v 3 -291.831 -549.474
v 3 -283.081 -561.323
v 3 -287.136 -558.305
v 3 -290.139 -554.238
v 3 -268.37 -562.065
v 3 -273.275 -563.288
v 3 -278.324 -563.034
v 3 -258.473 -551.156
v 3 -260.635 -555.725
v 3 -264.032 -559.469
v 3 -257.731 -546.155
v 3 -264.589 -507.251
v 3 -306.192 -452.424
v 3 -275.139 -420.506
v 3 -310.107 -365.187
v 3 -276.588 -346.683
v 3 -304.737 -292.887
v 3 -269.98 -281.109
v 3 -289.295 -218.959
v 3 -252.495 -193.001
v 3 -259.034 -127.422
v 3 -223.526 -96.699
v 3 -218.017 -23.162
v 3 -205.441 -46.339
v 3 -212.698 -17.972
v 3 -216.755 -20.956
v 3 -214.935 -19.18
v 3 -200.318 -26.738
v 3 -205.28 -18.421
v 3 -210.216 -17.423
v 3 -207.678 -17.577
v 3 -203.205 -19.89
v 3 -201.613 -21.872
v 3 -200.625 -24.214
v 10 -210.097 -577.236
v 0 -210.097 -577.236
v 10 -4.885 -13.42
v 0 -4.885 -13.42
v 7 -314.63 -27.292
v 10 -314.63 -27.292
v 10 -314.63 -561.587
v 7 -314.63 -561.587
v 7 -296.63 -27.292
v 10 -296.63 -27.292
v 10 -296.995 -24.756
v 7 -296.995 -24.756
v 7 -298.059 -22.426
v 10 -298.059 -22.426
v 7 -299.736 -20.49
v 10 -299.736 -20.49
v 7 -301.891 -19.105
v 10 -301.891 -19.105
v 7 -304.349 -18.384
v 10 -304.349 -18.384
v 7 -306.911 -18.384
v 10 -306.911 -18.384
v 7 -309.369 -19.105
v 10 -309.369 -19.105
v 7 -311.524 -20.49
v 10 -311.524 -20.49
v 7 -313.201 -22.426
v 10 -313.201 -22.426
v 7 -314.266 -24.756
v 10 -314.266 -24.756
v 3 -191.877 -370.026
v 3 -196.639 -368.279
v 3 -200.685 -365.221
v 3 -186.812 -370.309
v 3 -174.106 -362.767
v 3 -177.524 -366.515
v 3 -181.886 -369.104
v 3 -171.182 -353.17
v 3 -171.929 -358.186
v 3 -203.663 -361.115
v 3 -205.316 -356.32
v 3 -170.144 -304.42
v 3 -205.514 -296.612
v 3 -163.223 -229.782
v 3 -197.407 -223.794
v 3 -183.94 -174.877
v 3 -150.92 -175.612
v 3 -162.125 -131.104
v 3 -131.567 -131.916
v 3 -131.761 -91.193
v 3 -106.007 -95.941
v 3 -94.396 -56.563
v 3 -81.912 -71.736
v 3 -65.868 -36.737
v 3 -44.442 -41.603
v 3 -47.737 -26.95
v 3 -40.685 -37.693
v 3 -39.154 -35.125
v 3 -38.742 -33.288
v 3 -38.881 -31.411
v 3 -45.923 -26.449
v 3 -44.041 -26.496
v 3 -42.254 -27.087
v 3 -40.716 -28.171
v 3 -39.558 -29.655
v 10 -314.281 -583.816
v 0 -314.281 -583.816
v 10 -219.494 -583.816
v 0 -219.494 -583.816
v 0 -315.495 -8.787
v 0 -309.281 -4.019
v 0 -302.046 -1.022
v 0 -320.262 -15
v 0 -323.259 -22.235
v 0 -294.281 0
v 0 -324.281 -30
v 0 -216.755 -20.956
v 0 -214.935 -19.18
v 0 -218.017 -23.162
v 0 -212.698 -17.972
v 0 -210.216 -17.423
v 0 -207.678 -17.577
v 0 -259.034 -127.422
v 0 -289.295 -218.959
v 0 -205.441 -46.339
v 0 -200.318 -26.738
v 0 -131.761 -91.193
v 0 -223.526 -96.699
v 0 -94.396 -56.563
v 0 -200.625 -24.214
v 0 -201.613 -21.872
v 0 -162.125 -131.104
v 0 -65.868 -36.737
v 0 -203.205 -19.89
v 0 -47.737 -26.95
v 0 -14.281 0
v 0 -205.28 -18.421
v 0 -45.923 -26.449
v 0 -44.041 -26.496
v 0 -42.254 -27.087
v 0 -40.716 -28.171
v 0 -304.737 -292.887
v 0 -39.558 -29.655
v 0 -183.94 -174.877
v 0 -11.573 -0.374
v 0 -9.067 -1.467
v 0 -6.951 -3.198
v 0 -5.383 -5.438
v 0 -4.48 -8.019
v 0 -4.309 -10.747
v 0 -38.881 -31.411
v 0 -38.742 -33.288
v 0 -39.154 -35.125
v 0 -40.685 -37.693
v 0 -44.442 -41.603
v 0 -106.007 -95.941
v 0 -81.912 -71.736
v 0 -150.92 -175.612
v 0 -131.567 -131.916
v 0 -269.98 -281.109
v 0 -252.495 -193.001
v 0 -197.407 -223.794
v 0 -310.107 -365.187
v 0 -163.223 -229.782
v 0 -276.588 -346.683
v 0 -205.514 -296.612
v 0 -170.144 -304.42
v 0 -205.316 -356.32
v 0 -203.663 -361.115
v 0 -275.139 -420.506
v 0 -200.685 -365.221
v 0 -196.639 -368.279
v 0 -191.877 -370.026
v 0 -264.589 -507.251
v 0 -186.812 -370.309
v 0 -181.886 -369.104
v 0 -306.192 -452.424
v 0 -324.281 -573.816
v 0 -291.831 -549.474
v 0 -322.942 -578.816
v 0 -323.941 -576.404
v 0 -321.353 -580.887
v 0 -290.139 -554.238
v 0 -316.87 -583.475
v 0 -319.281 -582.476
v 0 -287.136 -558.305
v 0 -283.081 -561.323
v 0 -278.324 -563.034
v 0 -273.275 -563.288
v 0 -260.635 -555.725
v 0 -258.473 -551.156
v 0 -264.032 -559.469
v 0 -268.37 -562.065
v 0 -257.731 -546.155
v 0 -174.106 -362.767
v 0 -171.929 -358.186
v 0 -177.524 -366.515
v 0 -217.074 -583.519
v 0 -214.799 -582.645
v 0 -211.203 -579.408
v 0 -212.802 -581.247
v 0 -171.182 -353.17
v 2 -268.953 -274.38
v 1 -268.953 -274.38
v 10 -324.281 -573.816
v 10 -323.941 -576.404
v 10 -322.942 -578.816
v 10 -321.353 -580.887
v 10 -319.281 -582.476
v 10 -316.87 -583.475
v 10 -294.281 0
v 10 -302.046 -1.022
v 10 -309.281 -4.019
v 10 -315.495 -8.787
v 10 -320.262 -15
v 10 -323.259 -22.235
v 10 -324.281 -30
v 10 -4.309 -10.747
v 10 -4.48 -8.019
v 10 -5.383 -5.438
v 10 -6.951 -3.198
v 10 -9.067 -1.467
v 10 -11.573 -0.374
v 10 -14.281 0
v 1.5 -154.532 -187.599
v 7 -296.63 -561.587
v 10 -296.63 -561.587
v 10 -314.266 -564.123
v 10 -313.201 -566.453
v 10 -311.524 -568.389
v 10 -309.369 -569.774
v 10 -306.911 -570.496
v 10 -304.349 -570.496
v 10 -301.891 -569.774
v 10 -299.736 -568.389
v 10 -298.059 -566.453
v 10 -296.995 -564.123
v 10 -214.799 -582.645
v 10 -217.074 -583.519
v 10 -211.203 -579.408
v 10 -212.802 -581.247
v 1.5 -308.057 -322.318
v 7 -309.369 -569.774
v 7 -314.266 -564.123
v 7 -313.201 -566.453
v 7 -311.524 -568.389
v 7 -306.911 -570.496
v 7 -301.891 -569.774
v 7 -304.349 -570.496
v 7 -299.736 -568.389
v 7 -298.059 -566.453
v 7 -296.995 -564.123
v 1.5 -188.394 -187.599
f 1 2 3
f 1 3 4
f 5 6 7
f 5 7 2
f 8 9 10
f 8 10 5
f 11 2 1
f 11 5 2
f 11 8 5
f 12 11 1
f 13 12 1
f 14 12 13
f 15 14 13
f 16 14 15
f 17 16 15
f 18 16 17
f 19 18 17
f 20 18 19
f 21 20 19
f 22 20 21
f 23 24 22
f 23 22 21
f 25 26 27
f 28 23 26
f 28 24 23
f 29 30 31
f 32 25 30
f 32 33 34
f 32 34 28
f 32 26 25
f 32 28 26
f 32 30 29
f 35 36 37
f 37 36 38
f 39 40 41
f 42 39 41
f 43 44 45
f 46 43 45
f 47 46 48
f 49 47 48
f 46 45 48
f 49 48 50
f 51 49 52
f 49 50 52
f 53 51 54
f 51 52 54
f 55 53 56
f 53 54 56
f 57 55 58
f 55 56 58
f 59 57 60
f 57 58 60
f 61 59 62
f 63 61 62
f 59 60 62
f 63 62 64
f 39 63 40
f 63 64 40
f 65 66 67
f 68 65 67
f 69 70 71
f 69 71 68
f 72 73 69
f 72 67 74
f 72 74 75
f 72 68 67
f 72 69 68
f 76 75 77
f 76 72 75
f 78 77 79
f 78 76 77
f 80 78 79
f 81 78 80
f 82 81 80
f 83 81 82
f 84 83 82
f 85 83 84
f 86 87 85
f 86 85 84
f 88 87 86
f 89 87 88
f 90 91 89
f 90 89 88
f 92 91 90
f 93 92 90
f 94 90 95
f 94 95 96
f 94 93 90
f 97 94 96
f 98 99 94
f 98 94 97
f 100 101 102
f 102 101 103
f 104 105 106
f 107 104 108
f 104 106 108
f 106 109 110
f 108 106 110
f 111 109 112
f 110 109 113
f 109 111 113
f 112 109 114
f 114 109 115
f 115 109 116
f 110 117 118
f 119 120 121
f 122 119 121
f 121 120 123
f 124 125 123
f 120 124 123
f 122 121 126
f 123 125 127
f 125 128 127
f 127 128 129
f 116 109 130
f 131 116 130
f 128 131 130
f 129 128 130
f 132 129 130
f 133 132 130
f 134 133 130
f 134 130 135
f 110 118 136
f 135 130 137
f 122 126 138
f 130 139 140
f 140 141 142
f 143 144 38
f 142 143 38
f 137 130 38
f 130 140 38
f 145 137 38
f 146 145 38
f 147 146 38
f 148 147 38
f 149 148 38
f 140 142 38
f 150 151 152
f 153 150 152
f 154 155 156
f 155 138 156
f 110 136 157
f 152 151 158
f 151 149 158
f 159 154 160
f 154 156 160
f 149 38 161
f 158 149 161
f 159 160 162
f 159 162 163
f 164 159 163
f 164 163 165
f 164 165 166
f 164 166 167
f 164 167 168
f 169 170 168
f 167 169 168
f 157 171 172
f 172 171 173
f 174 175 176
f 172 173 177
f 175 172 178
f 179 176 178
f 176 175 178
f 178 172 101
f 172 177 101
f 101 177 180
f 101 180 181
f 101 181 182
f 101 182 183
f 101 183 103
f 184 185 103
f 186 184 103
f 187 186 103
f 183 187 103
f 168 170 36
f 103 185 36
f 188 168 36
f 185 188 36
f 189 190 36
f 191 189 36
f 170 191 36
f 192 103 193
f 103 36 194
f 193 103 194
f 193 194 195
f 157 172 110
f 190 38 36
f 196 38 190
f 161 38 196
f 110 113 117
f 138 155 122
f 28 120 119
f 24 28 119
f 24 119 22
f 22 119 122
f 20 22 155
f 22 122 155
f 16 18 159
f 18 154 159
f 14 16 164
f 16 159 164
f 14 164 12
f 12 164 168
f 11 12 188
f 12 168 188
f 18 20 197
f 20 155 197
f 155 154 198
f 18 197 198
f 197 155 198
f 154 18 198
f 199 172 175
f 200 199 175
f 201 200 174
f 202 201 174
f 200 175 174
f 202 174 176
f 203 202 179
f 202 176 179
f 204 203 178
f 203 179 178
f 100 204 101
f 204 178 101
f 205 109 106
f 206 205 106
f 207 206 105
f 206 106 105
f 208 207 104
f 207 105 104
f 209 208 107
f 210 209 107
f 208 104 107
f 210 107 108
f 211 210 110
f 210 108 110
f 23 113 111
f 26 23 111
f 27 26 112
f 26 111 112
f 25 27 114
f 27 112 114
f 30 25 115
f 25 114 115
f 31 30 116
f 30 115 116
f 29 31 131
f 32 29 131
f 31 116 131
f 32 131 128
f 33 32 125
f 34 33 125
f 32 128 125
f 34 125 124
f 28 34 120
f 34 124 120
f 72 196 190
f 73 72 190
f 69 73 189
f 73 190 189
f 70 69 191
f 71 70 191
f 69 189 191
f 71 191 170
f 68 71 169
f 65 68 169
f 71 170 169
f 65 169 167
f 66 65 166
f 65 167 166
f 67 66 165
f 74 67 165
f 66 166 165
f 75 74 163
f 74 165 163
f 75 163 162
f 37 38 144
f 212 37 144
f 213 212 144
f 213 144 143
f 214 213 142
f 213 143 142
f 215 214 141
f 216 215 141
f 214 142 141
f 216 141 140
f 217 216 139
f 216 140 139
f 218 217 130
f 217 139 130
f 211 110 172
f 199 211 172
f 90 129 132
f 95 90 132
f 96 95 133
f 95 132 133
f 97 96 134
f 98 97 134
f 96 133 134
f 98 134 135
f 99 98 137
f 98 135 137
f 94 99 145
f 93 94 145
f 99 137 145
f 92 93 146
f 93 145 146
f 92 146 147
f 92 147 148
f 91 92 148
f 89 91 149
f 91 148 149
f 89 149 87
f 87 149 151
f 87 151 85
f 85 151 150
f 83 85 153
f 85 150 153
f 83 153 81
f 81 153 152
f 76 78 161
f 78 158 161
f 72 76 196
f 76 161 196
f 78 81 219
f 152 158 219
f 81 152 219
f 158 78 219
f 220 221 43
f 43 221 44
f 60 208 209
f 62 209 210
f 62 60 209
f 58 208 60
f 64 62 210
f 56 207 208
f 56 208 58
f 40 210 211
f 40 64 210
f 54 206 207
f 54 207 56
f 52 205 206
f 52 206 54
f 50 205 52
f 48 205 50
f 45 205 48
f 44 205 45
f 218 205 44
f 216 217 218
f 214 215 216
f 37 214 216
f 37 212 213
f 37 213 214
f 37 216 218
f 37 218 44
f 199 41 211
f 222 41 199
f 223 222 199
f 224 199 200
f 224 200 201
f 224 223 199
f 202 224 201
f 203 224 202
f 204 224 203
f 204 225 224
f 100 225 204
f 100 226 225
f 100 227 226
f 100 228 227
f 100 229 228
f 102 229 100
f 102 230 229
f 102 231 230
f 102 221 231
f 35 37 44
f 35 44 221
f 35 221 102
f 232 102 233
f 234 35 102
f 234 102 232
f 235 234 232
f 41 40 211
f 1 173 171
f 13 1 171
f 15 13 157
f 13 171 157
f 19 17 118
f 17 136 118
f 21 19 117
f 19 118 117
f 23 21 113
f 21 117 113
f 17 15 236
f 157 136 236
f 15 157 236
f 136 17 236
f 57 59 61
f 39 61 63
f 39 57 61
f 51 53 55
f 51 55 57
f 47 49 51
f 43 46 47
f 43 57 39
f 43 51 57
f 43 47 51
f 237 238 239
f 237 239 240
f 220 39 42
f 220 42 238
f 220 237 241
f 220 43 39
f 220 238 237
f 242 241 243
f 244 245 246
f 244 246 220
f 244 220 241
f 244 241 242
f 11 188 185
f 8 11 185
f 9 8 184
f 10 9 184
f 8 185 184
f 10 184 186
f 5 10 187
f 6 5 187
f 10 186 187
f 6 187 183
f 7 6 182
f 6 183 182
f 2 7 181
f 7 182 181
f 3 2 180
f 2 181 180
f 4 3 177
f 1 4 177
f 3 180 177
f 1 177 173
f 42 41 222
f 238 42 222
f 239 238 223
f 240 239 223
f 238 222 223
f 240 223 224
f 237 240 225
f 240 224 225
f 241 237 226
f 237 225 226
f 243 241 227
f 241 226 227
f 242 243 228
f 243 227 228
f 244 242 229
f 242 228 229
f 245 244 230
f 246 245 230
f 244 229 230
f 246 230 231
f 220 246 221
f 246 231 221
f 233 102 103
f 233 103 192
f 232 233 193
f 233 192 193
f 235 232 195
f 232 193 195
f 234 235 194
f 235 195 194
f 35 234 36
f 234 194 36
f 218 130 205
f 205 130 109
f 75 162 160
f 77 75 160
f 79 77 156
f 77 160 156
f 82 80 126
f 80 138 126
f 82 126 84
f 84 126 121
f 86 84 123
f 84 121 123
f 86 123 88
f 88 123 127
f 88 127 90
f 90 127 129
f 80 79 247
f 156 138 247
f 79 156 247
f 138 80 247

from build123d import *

# Parameters (mm, degrees)
BOSS_EXTRUDE1_DEPTH = 10
CUT_EXTRUDE4_DEPTH  = 3
CUT_EXTRUDE5_DEPTH  = 3


with BuildPart() as part:
    # Sketch1 → Boss-Extrude1 (new body)
    with BuildSketch(Plane(origin=(0, 0, 0), x_dir=(0, 0, -1), z_dir=(1, 0, 0))):
        with BuildLine():
            Line((0, -14.281480067), (0, -294.281480067))
            ThreePointArc((0, -294.281480067), (8.786796564, -315.494683503), (30, -324.281480067))
            Line((30, -324.281480067), (573.815572472, -324.281480067))
            ThreePointArc((573.815572472, -324.281480067), (580.886640283, -321.352547879), (583.815572472, -314.281480067))
            Line((583.815572472, -314.281480067), (583.815572472, -219.493566063))
            ThreePointArc((583.815572472, -219.493566063), (582.007092914, -213.757801699), (577.235773905, -210.096639855))
            Line((577.235773905, -210.096639855), (13.420201433, -4.88455386))
            ThreePointArc((13.420201433, -4.88455386), (4.264235636, -6.089959625), (0, -14.281480067))
        make_face()
    extrude(amount=BOSS_EXTRUDE1_DEPTH)

    # Sketch3 → Cut-Extrude4 (cut)
    with BuildSketch(Plane.ZY):
        with BuildLine():
            ThreePointArc((-23.162175785, -218.017297737), (-17.576945532, -207.678107035), (-26.738120061, -200.318314743))
            add(Edge.make_bspline(
                [(-26.738120061, -200.318314743), (-45.914354434, -200.660753587), (-151.32107334, -255.510398156), (-414.880335601, -286.385074175), (-542.431128002, -257.731725159), (-546.154906269, -257.731029979)],
                knots=[0, 0, 0, 0, 0.560935224, 0.660935224, 1, 1, 1, 1], degree=3))
            ThreePointArc((-546.154906269, -257.731029979), (-563.288388976, -273.27487263), (-549.474047026, -291.831036849))
            add(Edge.make_bspline(
                [(-549.474047026, -291.831036849), (-474.750080899, -306.502271197), (-284.669923623, -324.572171749), (-143.080818041, -266.034178467), (-23.162175785, -218.017297737)],
                knots=[0, 0, 0, 0, 0.423888314, 1, 1, 1, 1], degree=3))
        make_face()
        with BuildLine():
            ThreePointArc((-26.950185671, -47.737214996), (-28.17113687, -40.715672082), (-35.124917897, -39.154353359))
            add(Edge.make_bspline(
                [(-35.124917897, -39.154353359), (-50.602952828, -45.122445935), (-99.042539, -170.661871263), (-331.224003862, -171.181746235), (-353.169530365, -171.181734297)],
                knots=[0, 0, 0, 0, 0.639195597, 1, 1, 1, 1], degree=3))
            ThreePointArc((-353.169530365, -171.181734297), (-370.309371751, -186.812434708), (-356.32010769, -205.316311305))
            add(Edge.make_bspline(
                [(-356.32010769, -205.316311305), (-352.838937223, -205.964445921), (-121.396454164, -217.989087479), (-35.312726243, -66.629555086), (-26.950185671, -47.737214996)],
                knots=[0, 0, 0, 0, 0.40968467, 1, 1, 1, 1], degree=3))
        make_face()
    extrude(amount=-CUT_EXTRUDE4_DEPTH, mode=Mode.SUBTRACT)

    # Sketch5 → Cut-Extrude5 (cut)
    with BuildSketch(Plane(origin=(10, 0, 0), x_dir=(0, 0, -1), z_dir=(1, 0, 0))):
        with BuildLine():
            Line((561.587294138, -296.630106089), (27.291979273, -296.630106089))
            ThreePointArc((27.291979273, -296.630106089), (18.291979273, -305.630106089), (27.291979273, -314.630106089))
            Line((27.291979273, -314.630106089), (561.587294138, -314.630106089))
            ThreePointArc((561.587294138, -314.630106089), (570.587294138, -305.630106089), (561.587294138, -296.630106089))
        make_face()
    extrude(amount=-CUT_EXTRUDE5_DEPTH, mode=Mode.SUBTRACT)


solid = part.part
